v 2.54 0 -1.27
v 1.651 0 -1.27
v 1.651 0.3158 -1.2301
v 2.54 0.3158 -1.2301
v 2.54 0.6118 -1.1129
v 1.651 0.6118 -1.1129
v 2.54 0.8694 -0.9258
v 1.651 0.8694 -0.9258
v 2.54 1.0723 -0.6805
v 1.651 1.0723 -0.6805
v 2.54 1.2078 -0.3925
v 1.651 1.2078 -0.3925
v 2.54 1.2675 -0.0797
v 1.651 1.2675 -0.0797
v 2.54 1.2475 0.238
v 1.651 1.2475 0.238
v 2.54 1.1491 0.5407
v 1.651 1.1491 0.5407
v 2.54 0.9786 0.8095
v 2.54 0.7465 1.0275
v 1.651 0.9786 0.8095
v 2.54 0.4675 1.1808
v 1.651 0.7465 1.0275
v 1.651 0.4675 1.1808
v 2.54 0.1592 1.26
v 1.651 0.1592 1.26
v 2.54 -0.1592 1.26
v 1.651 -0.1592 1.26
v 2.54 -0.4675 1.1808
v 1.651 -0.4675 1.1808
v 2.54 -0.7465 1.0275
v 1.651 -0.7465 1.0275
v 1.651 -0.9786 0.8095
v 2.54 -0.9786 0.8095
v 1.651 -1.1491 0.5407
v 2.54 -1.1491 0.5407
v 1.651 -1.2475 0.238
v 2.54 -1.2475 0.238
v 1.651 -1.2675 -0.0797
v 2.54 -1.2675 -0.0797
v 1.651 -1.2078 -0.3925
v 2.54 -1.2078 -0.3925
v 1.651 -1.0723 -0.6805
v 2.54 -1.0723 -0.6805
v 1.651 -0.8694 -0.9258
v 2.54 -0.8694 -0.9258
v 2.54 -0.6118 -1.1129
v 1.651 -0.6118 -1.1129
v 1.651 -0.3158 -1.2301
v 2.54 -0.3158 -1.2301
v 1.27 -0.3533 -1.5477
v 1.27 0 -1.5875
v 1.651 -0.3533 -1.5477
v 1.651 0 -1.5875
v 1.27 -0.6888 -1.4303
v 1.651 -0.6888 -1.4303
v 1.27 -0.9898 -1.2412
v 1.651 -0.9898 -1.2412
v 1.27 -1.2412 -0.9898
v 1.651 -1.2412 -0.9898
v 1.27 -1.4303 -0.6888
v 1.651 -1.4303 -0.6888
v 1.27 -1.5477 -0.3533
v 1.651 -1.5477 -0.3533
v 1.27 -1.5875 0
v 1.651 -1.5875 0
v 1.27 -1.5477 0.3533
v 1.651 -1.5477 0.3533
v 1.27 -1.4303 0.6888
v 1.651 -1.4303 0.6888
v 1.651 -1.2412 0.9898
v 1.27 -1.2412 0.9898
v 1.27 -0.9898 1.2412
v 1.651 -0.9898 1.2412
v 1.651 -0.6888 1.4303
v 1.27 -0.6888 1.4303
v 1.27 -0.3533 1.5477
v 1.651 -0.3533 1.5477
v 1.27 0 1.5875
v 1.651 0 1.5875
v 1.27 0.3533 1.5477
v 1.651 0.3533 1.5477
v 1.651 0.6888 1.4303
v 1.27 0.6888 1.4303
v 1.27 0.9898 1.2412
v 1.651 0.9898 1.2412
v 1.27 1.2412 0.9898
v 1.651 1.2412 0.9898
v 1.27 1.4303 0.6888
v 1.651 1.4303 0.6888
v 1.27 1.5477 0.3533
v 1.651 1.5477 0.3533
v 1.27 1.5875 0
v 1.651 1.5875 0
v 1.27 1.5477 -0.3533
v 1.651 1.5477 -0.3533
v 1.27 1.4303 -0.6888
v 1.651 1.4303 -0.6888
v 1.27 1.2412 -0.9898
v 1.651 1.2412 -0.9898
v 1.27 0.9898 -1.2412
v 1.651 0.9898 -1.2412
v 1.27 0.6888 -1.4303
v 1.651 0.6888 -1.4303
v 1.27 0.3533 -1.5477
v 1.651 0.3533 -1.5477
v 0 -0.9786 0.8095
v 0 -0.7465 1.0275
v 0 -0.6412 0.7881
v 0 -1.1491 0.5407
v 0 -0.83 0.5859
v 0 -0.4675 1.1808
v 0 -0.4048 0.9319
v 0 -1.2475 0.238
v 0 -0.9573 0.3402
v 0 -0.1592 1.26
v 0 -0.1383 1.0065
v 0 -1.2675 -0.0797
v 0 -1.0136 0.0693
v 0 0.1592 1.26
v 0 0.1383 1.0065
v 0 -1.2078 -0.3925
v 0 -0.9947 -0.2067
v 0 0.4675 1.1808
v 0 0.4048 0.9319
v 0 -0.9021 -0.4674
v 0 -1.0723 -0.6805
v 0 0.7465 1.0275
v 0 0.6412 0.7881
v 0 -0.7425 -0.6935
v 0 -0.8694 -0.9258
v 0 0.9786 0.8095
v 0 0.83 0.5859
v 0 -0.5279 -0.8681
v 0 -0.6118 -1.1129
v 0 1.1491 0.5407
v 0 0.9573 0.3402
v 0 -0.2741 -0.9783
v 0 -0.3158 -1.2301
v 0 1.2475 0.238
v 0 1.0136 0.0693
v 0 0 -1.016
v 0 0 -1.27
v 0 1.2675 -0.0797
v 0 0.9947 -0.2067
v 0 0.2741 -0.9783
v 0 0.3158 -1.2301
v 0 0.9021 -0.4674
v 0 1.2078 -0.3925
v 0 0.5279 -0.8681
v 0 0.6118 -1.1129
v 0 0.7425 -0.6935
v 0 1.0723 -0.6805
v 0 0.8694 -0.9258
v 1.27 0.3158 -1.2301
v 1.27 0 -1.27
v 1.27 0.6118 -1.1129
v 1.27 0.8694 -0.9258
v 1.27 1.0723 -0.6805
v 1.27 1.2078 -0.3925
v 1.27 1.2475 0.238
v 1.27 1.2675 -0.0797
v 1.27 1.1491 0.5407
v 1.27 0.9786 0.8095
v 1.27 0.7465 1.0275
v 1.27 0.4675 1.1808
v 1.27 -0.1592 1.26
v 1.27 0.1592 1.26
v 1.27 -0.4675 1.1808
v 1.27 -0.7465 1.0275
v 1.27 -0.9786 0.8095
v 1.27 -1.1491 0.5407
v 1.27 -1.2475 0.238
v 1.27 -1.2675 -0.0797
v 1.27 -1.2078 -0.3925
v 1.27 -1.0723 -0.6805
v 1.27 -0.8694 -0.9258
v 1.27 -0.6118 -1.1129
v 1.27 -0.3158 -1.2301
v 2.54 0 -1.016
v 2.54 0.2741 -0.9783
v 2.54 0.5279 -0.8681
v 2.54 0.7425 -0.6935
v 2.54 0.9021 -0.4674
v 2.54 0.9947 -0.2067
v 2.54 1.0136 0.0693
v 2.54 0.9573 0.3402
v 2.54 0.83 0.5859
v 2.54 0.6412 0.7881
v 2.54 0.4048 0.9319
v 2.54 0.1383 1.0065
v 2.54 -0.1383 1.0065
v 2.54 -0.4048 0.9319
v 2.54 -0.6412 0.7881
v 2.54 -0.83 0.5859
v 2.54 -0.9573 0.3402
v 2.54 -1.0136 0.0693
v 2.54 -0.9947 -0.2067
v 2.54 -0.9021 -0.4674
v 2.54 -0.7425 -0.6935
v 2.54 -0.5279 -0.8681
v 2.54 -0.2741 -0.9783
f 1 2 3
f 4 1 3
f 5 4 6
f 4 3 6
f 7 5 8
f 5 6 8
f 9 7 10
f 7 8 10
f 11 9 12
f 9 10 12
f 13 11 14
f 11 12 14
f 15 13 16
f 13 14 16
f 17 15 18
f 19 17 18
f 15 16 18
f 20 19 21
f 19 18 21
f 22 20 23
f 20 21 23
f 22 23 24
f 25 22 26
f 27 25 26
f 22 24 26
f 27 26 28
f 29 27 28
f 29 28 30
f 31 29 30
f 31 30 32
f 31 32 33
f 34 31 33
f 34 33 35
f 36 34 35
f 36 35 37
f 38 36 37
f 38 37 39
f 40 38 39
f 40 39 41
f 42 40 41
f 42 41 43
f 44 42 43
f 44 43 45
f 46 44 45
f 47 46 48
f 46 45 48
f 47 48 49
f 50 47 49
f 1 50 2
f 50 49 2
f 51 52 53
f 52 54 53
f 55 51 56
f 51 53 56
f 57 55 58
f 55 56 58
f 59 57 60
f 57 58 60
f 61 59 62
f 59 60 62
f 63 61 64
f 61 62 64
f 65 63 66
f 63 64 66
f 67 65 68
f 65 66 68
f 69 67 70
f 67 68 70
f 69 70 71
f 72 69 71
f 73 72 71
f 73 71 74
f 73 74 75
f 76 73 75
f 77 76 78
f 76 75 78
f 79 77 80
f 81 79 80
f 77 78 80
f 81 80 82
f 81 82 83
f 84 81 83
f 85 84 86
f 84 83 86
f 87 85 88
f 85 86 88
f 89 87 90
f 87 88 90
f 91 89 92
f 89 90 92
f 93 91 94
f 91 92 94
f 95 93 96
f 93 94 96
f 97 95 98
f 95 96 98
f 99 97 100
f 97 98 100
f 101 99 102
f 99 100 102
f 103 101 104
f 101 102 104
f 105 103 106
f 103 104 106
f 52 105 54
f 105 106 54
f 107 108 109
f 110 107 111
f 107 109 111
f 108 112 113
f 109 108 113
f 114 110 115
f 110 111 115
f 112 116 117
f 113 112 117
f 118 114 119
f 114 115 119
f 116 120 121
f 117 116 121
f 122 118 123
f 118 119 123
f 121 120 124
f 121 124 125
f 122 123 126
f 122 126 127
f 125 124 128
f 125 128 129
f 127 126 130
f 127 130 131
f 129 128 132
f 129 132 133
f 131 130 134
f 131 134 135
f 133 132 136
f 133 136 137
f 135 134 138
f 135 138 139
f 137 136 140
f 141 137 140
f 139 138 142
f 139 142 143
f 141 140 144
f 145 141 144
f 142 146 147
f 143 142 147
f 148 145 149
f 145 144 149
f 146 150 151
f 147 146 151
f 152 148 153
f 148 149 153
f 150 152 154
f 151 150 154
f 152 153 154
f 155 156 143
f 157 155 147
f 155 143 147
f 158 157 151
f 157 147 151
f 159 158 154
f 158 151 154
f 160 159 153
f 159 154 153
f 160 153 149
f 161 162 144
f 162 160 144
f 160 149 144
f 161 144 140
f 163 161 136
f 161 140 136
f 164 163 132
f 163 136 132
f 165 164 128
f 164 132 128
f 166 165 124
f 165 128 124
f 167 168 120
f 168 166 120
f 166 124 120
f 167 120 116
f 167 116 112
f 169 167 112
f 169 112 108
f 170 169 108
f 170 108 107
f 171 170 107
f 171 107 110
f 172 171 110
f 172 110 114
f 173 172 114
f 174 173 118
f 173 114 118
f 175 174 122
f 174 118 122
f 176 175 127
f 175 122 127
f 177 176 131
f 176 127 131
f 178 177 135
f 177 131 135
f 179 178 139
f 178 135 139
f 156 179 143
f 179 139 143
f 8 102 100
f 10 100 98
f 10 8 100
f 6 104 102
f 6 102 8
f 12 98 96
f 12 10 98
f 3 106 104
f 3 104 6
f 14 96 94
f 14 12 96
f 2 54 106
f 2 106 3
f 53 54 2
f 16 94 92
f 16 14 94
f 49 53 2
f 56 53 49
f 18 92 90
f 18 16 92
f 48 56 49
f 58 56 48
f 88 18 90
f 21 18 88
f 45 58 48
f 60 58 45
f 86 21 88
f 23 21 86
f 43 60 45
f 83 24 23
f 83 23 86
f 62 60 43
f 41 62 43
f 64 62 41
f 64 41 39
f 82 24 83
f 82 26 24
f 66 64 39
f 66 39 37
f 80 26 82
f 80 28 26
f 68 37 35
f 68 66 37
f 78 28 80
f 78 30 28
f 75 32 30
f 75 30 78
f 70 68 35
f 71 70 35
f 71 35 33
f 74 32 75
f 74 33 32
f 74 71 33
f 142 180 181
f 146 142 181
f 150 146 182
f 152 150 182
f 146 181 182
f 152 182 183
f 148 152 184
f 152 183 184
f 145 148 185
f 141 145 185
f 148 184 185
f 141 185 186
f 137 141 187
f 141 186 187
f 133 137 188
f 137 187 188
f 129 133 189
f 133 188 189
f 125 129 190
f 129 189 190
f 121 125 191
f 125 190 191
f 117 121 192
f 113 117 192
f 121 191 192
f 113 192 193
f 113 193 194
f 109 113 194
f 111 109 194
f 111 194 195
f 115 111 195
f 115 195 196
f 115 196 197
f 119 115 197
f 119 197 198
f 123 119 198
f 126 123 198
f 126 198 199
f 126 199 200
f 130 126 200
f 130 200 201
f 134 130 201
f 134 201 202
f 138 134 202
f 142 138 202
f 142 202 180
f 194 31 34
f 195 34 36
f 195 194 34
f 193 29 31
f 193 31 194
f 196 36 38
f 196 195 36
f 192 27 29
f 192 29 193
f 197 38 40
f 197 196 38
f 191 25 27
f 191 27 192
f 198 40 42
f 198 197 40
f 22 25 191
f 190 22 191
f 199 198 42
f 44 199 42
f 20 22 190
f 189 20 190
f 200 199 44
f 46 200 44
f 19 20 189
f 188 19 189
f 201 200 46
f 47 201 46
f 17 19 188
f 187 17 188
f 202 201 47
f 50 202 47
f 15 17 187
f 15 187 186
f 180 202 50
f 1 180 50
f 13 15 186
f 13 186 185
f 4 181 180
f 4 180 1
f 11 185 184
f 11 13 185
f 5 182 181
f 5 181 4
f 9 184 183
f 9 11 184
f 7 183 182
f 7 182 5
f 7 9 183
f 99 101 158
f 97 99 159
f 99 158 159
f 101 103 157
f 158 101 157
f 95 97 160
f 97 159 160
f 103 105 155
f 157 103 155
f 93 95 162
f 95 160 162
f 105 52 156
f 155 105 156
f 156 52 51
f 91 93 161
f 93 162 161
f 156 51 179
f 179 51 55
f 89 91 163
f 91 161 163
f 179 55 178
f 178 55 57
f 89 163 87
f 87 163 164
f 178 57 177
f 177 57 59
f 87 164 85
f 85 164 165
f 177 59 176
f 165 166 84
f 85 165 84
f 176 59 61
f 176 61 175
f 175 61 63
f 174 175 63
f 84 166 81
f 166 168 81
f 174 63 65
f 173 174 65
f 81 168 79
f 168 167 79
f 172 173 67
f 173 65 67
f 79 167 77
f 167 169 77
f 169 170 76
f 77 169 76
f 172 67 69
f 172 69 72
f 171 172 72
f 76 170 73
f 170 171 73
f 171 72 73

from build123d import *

# Parameters (mm, degrees)
SKETCH1_R           = 1.27
BOSS_EXTRUDE1_DEPTH = 2.54
SKETCH2_W           = 0.381
SKETCH2_H           = 0.3175
SKETCH3_R           = 1.016
CUT_EXTRUDE1_DEPTH  = 4.389972345


with BuildPart() as part:
    # Sketch1 → Boss-Extrude1 (new body)
    with BuildSketch(Plane(origin=(0, 0, 0), x_dir=(0, 0, -1), z_dir=(1, 0, 0))):
        Circle(SKETCH1_R)
    extrude(amount=BOSS_EXTRUDE1_DEPTH)

    # Sketch2 → Revolve1 (revolve)
    with BuildSketch(Plane.XY, mode=Mode.PRIVATE) as revolve1_sk:
        with Locations((1.4605, 1.42875)):
            Rectangle(SKETCH2_W, SKETCH2_H)
    revolve(revolve1_sk.sketch.rotate(Axis((2.54, 0, 0), (-1, 0, 0)), 90), axis=Axis((2.54, 0, 0), (-1, 0, 0)))

    # Sketch3 → Cut-Extrude1 (cut, through all)
    with BuildSketch(Plane(origin=(2.54, 0, 0), x_dir=(0, 0, -1), z_dir=(1, 0, 0))):
        Circle(SKETCH3_R)
    extrude(amount=-CUT_EXTRUDE1_DEPTH, mode=Mode.SUBTRACT)


solid = part.part
